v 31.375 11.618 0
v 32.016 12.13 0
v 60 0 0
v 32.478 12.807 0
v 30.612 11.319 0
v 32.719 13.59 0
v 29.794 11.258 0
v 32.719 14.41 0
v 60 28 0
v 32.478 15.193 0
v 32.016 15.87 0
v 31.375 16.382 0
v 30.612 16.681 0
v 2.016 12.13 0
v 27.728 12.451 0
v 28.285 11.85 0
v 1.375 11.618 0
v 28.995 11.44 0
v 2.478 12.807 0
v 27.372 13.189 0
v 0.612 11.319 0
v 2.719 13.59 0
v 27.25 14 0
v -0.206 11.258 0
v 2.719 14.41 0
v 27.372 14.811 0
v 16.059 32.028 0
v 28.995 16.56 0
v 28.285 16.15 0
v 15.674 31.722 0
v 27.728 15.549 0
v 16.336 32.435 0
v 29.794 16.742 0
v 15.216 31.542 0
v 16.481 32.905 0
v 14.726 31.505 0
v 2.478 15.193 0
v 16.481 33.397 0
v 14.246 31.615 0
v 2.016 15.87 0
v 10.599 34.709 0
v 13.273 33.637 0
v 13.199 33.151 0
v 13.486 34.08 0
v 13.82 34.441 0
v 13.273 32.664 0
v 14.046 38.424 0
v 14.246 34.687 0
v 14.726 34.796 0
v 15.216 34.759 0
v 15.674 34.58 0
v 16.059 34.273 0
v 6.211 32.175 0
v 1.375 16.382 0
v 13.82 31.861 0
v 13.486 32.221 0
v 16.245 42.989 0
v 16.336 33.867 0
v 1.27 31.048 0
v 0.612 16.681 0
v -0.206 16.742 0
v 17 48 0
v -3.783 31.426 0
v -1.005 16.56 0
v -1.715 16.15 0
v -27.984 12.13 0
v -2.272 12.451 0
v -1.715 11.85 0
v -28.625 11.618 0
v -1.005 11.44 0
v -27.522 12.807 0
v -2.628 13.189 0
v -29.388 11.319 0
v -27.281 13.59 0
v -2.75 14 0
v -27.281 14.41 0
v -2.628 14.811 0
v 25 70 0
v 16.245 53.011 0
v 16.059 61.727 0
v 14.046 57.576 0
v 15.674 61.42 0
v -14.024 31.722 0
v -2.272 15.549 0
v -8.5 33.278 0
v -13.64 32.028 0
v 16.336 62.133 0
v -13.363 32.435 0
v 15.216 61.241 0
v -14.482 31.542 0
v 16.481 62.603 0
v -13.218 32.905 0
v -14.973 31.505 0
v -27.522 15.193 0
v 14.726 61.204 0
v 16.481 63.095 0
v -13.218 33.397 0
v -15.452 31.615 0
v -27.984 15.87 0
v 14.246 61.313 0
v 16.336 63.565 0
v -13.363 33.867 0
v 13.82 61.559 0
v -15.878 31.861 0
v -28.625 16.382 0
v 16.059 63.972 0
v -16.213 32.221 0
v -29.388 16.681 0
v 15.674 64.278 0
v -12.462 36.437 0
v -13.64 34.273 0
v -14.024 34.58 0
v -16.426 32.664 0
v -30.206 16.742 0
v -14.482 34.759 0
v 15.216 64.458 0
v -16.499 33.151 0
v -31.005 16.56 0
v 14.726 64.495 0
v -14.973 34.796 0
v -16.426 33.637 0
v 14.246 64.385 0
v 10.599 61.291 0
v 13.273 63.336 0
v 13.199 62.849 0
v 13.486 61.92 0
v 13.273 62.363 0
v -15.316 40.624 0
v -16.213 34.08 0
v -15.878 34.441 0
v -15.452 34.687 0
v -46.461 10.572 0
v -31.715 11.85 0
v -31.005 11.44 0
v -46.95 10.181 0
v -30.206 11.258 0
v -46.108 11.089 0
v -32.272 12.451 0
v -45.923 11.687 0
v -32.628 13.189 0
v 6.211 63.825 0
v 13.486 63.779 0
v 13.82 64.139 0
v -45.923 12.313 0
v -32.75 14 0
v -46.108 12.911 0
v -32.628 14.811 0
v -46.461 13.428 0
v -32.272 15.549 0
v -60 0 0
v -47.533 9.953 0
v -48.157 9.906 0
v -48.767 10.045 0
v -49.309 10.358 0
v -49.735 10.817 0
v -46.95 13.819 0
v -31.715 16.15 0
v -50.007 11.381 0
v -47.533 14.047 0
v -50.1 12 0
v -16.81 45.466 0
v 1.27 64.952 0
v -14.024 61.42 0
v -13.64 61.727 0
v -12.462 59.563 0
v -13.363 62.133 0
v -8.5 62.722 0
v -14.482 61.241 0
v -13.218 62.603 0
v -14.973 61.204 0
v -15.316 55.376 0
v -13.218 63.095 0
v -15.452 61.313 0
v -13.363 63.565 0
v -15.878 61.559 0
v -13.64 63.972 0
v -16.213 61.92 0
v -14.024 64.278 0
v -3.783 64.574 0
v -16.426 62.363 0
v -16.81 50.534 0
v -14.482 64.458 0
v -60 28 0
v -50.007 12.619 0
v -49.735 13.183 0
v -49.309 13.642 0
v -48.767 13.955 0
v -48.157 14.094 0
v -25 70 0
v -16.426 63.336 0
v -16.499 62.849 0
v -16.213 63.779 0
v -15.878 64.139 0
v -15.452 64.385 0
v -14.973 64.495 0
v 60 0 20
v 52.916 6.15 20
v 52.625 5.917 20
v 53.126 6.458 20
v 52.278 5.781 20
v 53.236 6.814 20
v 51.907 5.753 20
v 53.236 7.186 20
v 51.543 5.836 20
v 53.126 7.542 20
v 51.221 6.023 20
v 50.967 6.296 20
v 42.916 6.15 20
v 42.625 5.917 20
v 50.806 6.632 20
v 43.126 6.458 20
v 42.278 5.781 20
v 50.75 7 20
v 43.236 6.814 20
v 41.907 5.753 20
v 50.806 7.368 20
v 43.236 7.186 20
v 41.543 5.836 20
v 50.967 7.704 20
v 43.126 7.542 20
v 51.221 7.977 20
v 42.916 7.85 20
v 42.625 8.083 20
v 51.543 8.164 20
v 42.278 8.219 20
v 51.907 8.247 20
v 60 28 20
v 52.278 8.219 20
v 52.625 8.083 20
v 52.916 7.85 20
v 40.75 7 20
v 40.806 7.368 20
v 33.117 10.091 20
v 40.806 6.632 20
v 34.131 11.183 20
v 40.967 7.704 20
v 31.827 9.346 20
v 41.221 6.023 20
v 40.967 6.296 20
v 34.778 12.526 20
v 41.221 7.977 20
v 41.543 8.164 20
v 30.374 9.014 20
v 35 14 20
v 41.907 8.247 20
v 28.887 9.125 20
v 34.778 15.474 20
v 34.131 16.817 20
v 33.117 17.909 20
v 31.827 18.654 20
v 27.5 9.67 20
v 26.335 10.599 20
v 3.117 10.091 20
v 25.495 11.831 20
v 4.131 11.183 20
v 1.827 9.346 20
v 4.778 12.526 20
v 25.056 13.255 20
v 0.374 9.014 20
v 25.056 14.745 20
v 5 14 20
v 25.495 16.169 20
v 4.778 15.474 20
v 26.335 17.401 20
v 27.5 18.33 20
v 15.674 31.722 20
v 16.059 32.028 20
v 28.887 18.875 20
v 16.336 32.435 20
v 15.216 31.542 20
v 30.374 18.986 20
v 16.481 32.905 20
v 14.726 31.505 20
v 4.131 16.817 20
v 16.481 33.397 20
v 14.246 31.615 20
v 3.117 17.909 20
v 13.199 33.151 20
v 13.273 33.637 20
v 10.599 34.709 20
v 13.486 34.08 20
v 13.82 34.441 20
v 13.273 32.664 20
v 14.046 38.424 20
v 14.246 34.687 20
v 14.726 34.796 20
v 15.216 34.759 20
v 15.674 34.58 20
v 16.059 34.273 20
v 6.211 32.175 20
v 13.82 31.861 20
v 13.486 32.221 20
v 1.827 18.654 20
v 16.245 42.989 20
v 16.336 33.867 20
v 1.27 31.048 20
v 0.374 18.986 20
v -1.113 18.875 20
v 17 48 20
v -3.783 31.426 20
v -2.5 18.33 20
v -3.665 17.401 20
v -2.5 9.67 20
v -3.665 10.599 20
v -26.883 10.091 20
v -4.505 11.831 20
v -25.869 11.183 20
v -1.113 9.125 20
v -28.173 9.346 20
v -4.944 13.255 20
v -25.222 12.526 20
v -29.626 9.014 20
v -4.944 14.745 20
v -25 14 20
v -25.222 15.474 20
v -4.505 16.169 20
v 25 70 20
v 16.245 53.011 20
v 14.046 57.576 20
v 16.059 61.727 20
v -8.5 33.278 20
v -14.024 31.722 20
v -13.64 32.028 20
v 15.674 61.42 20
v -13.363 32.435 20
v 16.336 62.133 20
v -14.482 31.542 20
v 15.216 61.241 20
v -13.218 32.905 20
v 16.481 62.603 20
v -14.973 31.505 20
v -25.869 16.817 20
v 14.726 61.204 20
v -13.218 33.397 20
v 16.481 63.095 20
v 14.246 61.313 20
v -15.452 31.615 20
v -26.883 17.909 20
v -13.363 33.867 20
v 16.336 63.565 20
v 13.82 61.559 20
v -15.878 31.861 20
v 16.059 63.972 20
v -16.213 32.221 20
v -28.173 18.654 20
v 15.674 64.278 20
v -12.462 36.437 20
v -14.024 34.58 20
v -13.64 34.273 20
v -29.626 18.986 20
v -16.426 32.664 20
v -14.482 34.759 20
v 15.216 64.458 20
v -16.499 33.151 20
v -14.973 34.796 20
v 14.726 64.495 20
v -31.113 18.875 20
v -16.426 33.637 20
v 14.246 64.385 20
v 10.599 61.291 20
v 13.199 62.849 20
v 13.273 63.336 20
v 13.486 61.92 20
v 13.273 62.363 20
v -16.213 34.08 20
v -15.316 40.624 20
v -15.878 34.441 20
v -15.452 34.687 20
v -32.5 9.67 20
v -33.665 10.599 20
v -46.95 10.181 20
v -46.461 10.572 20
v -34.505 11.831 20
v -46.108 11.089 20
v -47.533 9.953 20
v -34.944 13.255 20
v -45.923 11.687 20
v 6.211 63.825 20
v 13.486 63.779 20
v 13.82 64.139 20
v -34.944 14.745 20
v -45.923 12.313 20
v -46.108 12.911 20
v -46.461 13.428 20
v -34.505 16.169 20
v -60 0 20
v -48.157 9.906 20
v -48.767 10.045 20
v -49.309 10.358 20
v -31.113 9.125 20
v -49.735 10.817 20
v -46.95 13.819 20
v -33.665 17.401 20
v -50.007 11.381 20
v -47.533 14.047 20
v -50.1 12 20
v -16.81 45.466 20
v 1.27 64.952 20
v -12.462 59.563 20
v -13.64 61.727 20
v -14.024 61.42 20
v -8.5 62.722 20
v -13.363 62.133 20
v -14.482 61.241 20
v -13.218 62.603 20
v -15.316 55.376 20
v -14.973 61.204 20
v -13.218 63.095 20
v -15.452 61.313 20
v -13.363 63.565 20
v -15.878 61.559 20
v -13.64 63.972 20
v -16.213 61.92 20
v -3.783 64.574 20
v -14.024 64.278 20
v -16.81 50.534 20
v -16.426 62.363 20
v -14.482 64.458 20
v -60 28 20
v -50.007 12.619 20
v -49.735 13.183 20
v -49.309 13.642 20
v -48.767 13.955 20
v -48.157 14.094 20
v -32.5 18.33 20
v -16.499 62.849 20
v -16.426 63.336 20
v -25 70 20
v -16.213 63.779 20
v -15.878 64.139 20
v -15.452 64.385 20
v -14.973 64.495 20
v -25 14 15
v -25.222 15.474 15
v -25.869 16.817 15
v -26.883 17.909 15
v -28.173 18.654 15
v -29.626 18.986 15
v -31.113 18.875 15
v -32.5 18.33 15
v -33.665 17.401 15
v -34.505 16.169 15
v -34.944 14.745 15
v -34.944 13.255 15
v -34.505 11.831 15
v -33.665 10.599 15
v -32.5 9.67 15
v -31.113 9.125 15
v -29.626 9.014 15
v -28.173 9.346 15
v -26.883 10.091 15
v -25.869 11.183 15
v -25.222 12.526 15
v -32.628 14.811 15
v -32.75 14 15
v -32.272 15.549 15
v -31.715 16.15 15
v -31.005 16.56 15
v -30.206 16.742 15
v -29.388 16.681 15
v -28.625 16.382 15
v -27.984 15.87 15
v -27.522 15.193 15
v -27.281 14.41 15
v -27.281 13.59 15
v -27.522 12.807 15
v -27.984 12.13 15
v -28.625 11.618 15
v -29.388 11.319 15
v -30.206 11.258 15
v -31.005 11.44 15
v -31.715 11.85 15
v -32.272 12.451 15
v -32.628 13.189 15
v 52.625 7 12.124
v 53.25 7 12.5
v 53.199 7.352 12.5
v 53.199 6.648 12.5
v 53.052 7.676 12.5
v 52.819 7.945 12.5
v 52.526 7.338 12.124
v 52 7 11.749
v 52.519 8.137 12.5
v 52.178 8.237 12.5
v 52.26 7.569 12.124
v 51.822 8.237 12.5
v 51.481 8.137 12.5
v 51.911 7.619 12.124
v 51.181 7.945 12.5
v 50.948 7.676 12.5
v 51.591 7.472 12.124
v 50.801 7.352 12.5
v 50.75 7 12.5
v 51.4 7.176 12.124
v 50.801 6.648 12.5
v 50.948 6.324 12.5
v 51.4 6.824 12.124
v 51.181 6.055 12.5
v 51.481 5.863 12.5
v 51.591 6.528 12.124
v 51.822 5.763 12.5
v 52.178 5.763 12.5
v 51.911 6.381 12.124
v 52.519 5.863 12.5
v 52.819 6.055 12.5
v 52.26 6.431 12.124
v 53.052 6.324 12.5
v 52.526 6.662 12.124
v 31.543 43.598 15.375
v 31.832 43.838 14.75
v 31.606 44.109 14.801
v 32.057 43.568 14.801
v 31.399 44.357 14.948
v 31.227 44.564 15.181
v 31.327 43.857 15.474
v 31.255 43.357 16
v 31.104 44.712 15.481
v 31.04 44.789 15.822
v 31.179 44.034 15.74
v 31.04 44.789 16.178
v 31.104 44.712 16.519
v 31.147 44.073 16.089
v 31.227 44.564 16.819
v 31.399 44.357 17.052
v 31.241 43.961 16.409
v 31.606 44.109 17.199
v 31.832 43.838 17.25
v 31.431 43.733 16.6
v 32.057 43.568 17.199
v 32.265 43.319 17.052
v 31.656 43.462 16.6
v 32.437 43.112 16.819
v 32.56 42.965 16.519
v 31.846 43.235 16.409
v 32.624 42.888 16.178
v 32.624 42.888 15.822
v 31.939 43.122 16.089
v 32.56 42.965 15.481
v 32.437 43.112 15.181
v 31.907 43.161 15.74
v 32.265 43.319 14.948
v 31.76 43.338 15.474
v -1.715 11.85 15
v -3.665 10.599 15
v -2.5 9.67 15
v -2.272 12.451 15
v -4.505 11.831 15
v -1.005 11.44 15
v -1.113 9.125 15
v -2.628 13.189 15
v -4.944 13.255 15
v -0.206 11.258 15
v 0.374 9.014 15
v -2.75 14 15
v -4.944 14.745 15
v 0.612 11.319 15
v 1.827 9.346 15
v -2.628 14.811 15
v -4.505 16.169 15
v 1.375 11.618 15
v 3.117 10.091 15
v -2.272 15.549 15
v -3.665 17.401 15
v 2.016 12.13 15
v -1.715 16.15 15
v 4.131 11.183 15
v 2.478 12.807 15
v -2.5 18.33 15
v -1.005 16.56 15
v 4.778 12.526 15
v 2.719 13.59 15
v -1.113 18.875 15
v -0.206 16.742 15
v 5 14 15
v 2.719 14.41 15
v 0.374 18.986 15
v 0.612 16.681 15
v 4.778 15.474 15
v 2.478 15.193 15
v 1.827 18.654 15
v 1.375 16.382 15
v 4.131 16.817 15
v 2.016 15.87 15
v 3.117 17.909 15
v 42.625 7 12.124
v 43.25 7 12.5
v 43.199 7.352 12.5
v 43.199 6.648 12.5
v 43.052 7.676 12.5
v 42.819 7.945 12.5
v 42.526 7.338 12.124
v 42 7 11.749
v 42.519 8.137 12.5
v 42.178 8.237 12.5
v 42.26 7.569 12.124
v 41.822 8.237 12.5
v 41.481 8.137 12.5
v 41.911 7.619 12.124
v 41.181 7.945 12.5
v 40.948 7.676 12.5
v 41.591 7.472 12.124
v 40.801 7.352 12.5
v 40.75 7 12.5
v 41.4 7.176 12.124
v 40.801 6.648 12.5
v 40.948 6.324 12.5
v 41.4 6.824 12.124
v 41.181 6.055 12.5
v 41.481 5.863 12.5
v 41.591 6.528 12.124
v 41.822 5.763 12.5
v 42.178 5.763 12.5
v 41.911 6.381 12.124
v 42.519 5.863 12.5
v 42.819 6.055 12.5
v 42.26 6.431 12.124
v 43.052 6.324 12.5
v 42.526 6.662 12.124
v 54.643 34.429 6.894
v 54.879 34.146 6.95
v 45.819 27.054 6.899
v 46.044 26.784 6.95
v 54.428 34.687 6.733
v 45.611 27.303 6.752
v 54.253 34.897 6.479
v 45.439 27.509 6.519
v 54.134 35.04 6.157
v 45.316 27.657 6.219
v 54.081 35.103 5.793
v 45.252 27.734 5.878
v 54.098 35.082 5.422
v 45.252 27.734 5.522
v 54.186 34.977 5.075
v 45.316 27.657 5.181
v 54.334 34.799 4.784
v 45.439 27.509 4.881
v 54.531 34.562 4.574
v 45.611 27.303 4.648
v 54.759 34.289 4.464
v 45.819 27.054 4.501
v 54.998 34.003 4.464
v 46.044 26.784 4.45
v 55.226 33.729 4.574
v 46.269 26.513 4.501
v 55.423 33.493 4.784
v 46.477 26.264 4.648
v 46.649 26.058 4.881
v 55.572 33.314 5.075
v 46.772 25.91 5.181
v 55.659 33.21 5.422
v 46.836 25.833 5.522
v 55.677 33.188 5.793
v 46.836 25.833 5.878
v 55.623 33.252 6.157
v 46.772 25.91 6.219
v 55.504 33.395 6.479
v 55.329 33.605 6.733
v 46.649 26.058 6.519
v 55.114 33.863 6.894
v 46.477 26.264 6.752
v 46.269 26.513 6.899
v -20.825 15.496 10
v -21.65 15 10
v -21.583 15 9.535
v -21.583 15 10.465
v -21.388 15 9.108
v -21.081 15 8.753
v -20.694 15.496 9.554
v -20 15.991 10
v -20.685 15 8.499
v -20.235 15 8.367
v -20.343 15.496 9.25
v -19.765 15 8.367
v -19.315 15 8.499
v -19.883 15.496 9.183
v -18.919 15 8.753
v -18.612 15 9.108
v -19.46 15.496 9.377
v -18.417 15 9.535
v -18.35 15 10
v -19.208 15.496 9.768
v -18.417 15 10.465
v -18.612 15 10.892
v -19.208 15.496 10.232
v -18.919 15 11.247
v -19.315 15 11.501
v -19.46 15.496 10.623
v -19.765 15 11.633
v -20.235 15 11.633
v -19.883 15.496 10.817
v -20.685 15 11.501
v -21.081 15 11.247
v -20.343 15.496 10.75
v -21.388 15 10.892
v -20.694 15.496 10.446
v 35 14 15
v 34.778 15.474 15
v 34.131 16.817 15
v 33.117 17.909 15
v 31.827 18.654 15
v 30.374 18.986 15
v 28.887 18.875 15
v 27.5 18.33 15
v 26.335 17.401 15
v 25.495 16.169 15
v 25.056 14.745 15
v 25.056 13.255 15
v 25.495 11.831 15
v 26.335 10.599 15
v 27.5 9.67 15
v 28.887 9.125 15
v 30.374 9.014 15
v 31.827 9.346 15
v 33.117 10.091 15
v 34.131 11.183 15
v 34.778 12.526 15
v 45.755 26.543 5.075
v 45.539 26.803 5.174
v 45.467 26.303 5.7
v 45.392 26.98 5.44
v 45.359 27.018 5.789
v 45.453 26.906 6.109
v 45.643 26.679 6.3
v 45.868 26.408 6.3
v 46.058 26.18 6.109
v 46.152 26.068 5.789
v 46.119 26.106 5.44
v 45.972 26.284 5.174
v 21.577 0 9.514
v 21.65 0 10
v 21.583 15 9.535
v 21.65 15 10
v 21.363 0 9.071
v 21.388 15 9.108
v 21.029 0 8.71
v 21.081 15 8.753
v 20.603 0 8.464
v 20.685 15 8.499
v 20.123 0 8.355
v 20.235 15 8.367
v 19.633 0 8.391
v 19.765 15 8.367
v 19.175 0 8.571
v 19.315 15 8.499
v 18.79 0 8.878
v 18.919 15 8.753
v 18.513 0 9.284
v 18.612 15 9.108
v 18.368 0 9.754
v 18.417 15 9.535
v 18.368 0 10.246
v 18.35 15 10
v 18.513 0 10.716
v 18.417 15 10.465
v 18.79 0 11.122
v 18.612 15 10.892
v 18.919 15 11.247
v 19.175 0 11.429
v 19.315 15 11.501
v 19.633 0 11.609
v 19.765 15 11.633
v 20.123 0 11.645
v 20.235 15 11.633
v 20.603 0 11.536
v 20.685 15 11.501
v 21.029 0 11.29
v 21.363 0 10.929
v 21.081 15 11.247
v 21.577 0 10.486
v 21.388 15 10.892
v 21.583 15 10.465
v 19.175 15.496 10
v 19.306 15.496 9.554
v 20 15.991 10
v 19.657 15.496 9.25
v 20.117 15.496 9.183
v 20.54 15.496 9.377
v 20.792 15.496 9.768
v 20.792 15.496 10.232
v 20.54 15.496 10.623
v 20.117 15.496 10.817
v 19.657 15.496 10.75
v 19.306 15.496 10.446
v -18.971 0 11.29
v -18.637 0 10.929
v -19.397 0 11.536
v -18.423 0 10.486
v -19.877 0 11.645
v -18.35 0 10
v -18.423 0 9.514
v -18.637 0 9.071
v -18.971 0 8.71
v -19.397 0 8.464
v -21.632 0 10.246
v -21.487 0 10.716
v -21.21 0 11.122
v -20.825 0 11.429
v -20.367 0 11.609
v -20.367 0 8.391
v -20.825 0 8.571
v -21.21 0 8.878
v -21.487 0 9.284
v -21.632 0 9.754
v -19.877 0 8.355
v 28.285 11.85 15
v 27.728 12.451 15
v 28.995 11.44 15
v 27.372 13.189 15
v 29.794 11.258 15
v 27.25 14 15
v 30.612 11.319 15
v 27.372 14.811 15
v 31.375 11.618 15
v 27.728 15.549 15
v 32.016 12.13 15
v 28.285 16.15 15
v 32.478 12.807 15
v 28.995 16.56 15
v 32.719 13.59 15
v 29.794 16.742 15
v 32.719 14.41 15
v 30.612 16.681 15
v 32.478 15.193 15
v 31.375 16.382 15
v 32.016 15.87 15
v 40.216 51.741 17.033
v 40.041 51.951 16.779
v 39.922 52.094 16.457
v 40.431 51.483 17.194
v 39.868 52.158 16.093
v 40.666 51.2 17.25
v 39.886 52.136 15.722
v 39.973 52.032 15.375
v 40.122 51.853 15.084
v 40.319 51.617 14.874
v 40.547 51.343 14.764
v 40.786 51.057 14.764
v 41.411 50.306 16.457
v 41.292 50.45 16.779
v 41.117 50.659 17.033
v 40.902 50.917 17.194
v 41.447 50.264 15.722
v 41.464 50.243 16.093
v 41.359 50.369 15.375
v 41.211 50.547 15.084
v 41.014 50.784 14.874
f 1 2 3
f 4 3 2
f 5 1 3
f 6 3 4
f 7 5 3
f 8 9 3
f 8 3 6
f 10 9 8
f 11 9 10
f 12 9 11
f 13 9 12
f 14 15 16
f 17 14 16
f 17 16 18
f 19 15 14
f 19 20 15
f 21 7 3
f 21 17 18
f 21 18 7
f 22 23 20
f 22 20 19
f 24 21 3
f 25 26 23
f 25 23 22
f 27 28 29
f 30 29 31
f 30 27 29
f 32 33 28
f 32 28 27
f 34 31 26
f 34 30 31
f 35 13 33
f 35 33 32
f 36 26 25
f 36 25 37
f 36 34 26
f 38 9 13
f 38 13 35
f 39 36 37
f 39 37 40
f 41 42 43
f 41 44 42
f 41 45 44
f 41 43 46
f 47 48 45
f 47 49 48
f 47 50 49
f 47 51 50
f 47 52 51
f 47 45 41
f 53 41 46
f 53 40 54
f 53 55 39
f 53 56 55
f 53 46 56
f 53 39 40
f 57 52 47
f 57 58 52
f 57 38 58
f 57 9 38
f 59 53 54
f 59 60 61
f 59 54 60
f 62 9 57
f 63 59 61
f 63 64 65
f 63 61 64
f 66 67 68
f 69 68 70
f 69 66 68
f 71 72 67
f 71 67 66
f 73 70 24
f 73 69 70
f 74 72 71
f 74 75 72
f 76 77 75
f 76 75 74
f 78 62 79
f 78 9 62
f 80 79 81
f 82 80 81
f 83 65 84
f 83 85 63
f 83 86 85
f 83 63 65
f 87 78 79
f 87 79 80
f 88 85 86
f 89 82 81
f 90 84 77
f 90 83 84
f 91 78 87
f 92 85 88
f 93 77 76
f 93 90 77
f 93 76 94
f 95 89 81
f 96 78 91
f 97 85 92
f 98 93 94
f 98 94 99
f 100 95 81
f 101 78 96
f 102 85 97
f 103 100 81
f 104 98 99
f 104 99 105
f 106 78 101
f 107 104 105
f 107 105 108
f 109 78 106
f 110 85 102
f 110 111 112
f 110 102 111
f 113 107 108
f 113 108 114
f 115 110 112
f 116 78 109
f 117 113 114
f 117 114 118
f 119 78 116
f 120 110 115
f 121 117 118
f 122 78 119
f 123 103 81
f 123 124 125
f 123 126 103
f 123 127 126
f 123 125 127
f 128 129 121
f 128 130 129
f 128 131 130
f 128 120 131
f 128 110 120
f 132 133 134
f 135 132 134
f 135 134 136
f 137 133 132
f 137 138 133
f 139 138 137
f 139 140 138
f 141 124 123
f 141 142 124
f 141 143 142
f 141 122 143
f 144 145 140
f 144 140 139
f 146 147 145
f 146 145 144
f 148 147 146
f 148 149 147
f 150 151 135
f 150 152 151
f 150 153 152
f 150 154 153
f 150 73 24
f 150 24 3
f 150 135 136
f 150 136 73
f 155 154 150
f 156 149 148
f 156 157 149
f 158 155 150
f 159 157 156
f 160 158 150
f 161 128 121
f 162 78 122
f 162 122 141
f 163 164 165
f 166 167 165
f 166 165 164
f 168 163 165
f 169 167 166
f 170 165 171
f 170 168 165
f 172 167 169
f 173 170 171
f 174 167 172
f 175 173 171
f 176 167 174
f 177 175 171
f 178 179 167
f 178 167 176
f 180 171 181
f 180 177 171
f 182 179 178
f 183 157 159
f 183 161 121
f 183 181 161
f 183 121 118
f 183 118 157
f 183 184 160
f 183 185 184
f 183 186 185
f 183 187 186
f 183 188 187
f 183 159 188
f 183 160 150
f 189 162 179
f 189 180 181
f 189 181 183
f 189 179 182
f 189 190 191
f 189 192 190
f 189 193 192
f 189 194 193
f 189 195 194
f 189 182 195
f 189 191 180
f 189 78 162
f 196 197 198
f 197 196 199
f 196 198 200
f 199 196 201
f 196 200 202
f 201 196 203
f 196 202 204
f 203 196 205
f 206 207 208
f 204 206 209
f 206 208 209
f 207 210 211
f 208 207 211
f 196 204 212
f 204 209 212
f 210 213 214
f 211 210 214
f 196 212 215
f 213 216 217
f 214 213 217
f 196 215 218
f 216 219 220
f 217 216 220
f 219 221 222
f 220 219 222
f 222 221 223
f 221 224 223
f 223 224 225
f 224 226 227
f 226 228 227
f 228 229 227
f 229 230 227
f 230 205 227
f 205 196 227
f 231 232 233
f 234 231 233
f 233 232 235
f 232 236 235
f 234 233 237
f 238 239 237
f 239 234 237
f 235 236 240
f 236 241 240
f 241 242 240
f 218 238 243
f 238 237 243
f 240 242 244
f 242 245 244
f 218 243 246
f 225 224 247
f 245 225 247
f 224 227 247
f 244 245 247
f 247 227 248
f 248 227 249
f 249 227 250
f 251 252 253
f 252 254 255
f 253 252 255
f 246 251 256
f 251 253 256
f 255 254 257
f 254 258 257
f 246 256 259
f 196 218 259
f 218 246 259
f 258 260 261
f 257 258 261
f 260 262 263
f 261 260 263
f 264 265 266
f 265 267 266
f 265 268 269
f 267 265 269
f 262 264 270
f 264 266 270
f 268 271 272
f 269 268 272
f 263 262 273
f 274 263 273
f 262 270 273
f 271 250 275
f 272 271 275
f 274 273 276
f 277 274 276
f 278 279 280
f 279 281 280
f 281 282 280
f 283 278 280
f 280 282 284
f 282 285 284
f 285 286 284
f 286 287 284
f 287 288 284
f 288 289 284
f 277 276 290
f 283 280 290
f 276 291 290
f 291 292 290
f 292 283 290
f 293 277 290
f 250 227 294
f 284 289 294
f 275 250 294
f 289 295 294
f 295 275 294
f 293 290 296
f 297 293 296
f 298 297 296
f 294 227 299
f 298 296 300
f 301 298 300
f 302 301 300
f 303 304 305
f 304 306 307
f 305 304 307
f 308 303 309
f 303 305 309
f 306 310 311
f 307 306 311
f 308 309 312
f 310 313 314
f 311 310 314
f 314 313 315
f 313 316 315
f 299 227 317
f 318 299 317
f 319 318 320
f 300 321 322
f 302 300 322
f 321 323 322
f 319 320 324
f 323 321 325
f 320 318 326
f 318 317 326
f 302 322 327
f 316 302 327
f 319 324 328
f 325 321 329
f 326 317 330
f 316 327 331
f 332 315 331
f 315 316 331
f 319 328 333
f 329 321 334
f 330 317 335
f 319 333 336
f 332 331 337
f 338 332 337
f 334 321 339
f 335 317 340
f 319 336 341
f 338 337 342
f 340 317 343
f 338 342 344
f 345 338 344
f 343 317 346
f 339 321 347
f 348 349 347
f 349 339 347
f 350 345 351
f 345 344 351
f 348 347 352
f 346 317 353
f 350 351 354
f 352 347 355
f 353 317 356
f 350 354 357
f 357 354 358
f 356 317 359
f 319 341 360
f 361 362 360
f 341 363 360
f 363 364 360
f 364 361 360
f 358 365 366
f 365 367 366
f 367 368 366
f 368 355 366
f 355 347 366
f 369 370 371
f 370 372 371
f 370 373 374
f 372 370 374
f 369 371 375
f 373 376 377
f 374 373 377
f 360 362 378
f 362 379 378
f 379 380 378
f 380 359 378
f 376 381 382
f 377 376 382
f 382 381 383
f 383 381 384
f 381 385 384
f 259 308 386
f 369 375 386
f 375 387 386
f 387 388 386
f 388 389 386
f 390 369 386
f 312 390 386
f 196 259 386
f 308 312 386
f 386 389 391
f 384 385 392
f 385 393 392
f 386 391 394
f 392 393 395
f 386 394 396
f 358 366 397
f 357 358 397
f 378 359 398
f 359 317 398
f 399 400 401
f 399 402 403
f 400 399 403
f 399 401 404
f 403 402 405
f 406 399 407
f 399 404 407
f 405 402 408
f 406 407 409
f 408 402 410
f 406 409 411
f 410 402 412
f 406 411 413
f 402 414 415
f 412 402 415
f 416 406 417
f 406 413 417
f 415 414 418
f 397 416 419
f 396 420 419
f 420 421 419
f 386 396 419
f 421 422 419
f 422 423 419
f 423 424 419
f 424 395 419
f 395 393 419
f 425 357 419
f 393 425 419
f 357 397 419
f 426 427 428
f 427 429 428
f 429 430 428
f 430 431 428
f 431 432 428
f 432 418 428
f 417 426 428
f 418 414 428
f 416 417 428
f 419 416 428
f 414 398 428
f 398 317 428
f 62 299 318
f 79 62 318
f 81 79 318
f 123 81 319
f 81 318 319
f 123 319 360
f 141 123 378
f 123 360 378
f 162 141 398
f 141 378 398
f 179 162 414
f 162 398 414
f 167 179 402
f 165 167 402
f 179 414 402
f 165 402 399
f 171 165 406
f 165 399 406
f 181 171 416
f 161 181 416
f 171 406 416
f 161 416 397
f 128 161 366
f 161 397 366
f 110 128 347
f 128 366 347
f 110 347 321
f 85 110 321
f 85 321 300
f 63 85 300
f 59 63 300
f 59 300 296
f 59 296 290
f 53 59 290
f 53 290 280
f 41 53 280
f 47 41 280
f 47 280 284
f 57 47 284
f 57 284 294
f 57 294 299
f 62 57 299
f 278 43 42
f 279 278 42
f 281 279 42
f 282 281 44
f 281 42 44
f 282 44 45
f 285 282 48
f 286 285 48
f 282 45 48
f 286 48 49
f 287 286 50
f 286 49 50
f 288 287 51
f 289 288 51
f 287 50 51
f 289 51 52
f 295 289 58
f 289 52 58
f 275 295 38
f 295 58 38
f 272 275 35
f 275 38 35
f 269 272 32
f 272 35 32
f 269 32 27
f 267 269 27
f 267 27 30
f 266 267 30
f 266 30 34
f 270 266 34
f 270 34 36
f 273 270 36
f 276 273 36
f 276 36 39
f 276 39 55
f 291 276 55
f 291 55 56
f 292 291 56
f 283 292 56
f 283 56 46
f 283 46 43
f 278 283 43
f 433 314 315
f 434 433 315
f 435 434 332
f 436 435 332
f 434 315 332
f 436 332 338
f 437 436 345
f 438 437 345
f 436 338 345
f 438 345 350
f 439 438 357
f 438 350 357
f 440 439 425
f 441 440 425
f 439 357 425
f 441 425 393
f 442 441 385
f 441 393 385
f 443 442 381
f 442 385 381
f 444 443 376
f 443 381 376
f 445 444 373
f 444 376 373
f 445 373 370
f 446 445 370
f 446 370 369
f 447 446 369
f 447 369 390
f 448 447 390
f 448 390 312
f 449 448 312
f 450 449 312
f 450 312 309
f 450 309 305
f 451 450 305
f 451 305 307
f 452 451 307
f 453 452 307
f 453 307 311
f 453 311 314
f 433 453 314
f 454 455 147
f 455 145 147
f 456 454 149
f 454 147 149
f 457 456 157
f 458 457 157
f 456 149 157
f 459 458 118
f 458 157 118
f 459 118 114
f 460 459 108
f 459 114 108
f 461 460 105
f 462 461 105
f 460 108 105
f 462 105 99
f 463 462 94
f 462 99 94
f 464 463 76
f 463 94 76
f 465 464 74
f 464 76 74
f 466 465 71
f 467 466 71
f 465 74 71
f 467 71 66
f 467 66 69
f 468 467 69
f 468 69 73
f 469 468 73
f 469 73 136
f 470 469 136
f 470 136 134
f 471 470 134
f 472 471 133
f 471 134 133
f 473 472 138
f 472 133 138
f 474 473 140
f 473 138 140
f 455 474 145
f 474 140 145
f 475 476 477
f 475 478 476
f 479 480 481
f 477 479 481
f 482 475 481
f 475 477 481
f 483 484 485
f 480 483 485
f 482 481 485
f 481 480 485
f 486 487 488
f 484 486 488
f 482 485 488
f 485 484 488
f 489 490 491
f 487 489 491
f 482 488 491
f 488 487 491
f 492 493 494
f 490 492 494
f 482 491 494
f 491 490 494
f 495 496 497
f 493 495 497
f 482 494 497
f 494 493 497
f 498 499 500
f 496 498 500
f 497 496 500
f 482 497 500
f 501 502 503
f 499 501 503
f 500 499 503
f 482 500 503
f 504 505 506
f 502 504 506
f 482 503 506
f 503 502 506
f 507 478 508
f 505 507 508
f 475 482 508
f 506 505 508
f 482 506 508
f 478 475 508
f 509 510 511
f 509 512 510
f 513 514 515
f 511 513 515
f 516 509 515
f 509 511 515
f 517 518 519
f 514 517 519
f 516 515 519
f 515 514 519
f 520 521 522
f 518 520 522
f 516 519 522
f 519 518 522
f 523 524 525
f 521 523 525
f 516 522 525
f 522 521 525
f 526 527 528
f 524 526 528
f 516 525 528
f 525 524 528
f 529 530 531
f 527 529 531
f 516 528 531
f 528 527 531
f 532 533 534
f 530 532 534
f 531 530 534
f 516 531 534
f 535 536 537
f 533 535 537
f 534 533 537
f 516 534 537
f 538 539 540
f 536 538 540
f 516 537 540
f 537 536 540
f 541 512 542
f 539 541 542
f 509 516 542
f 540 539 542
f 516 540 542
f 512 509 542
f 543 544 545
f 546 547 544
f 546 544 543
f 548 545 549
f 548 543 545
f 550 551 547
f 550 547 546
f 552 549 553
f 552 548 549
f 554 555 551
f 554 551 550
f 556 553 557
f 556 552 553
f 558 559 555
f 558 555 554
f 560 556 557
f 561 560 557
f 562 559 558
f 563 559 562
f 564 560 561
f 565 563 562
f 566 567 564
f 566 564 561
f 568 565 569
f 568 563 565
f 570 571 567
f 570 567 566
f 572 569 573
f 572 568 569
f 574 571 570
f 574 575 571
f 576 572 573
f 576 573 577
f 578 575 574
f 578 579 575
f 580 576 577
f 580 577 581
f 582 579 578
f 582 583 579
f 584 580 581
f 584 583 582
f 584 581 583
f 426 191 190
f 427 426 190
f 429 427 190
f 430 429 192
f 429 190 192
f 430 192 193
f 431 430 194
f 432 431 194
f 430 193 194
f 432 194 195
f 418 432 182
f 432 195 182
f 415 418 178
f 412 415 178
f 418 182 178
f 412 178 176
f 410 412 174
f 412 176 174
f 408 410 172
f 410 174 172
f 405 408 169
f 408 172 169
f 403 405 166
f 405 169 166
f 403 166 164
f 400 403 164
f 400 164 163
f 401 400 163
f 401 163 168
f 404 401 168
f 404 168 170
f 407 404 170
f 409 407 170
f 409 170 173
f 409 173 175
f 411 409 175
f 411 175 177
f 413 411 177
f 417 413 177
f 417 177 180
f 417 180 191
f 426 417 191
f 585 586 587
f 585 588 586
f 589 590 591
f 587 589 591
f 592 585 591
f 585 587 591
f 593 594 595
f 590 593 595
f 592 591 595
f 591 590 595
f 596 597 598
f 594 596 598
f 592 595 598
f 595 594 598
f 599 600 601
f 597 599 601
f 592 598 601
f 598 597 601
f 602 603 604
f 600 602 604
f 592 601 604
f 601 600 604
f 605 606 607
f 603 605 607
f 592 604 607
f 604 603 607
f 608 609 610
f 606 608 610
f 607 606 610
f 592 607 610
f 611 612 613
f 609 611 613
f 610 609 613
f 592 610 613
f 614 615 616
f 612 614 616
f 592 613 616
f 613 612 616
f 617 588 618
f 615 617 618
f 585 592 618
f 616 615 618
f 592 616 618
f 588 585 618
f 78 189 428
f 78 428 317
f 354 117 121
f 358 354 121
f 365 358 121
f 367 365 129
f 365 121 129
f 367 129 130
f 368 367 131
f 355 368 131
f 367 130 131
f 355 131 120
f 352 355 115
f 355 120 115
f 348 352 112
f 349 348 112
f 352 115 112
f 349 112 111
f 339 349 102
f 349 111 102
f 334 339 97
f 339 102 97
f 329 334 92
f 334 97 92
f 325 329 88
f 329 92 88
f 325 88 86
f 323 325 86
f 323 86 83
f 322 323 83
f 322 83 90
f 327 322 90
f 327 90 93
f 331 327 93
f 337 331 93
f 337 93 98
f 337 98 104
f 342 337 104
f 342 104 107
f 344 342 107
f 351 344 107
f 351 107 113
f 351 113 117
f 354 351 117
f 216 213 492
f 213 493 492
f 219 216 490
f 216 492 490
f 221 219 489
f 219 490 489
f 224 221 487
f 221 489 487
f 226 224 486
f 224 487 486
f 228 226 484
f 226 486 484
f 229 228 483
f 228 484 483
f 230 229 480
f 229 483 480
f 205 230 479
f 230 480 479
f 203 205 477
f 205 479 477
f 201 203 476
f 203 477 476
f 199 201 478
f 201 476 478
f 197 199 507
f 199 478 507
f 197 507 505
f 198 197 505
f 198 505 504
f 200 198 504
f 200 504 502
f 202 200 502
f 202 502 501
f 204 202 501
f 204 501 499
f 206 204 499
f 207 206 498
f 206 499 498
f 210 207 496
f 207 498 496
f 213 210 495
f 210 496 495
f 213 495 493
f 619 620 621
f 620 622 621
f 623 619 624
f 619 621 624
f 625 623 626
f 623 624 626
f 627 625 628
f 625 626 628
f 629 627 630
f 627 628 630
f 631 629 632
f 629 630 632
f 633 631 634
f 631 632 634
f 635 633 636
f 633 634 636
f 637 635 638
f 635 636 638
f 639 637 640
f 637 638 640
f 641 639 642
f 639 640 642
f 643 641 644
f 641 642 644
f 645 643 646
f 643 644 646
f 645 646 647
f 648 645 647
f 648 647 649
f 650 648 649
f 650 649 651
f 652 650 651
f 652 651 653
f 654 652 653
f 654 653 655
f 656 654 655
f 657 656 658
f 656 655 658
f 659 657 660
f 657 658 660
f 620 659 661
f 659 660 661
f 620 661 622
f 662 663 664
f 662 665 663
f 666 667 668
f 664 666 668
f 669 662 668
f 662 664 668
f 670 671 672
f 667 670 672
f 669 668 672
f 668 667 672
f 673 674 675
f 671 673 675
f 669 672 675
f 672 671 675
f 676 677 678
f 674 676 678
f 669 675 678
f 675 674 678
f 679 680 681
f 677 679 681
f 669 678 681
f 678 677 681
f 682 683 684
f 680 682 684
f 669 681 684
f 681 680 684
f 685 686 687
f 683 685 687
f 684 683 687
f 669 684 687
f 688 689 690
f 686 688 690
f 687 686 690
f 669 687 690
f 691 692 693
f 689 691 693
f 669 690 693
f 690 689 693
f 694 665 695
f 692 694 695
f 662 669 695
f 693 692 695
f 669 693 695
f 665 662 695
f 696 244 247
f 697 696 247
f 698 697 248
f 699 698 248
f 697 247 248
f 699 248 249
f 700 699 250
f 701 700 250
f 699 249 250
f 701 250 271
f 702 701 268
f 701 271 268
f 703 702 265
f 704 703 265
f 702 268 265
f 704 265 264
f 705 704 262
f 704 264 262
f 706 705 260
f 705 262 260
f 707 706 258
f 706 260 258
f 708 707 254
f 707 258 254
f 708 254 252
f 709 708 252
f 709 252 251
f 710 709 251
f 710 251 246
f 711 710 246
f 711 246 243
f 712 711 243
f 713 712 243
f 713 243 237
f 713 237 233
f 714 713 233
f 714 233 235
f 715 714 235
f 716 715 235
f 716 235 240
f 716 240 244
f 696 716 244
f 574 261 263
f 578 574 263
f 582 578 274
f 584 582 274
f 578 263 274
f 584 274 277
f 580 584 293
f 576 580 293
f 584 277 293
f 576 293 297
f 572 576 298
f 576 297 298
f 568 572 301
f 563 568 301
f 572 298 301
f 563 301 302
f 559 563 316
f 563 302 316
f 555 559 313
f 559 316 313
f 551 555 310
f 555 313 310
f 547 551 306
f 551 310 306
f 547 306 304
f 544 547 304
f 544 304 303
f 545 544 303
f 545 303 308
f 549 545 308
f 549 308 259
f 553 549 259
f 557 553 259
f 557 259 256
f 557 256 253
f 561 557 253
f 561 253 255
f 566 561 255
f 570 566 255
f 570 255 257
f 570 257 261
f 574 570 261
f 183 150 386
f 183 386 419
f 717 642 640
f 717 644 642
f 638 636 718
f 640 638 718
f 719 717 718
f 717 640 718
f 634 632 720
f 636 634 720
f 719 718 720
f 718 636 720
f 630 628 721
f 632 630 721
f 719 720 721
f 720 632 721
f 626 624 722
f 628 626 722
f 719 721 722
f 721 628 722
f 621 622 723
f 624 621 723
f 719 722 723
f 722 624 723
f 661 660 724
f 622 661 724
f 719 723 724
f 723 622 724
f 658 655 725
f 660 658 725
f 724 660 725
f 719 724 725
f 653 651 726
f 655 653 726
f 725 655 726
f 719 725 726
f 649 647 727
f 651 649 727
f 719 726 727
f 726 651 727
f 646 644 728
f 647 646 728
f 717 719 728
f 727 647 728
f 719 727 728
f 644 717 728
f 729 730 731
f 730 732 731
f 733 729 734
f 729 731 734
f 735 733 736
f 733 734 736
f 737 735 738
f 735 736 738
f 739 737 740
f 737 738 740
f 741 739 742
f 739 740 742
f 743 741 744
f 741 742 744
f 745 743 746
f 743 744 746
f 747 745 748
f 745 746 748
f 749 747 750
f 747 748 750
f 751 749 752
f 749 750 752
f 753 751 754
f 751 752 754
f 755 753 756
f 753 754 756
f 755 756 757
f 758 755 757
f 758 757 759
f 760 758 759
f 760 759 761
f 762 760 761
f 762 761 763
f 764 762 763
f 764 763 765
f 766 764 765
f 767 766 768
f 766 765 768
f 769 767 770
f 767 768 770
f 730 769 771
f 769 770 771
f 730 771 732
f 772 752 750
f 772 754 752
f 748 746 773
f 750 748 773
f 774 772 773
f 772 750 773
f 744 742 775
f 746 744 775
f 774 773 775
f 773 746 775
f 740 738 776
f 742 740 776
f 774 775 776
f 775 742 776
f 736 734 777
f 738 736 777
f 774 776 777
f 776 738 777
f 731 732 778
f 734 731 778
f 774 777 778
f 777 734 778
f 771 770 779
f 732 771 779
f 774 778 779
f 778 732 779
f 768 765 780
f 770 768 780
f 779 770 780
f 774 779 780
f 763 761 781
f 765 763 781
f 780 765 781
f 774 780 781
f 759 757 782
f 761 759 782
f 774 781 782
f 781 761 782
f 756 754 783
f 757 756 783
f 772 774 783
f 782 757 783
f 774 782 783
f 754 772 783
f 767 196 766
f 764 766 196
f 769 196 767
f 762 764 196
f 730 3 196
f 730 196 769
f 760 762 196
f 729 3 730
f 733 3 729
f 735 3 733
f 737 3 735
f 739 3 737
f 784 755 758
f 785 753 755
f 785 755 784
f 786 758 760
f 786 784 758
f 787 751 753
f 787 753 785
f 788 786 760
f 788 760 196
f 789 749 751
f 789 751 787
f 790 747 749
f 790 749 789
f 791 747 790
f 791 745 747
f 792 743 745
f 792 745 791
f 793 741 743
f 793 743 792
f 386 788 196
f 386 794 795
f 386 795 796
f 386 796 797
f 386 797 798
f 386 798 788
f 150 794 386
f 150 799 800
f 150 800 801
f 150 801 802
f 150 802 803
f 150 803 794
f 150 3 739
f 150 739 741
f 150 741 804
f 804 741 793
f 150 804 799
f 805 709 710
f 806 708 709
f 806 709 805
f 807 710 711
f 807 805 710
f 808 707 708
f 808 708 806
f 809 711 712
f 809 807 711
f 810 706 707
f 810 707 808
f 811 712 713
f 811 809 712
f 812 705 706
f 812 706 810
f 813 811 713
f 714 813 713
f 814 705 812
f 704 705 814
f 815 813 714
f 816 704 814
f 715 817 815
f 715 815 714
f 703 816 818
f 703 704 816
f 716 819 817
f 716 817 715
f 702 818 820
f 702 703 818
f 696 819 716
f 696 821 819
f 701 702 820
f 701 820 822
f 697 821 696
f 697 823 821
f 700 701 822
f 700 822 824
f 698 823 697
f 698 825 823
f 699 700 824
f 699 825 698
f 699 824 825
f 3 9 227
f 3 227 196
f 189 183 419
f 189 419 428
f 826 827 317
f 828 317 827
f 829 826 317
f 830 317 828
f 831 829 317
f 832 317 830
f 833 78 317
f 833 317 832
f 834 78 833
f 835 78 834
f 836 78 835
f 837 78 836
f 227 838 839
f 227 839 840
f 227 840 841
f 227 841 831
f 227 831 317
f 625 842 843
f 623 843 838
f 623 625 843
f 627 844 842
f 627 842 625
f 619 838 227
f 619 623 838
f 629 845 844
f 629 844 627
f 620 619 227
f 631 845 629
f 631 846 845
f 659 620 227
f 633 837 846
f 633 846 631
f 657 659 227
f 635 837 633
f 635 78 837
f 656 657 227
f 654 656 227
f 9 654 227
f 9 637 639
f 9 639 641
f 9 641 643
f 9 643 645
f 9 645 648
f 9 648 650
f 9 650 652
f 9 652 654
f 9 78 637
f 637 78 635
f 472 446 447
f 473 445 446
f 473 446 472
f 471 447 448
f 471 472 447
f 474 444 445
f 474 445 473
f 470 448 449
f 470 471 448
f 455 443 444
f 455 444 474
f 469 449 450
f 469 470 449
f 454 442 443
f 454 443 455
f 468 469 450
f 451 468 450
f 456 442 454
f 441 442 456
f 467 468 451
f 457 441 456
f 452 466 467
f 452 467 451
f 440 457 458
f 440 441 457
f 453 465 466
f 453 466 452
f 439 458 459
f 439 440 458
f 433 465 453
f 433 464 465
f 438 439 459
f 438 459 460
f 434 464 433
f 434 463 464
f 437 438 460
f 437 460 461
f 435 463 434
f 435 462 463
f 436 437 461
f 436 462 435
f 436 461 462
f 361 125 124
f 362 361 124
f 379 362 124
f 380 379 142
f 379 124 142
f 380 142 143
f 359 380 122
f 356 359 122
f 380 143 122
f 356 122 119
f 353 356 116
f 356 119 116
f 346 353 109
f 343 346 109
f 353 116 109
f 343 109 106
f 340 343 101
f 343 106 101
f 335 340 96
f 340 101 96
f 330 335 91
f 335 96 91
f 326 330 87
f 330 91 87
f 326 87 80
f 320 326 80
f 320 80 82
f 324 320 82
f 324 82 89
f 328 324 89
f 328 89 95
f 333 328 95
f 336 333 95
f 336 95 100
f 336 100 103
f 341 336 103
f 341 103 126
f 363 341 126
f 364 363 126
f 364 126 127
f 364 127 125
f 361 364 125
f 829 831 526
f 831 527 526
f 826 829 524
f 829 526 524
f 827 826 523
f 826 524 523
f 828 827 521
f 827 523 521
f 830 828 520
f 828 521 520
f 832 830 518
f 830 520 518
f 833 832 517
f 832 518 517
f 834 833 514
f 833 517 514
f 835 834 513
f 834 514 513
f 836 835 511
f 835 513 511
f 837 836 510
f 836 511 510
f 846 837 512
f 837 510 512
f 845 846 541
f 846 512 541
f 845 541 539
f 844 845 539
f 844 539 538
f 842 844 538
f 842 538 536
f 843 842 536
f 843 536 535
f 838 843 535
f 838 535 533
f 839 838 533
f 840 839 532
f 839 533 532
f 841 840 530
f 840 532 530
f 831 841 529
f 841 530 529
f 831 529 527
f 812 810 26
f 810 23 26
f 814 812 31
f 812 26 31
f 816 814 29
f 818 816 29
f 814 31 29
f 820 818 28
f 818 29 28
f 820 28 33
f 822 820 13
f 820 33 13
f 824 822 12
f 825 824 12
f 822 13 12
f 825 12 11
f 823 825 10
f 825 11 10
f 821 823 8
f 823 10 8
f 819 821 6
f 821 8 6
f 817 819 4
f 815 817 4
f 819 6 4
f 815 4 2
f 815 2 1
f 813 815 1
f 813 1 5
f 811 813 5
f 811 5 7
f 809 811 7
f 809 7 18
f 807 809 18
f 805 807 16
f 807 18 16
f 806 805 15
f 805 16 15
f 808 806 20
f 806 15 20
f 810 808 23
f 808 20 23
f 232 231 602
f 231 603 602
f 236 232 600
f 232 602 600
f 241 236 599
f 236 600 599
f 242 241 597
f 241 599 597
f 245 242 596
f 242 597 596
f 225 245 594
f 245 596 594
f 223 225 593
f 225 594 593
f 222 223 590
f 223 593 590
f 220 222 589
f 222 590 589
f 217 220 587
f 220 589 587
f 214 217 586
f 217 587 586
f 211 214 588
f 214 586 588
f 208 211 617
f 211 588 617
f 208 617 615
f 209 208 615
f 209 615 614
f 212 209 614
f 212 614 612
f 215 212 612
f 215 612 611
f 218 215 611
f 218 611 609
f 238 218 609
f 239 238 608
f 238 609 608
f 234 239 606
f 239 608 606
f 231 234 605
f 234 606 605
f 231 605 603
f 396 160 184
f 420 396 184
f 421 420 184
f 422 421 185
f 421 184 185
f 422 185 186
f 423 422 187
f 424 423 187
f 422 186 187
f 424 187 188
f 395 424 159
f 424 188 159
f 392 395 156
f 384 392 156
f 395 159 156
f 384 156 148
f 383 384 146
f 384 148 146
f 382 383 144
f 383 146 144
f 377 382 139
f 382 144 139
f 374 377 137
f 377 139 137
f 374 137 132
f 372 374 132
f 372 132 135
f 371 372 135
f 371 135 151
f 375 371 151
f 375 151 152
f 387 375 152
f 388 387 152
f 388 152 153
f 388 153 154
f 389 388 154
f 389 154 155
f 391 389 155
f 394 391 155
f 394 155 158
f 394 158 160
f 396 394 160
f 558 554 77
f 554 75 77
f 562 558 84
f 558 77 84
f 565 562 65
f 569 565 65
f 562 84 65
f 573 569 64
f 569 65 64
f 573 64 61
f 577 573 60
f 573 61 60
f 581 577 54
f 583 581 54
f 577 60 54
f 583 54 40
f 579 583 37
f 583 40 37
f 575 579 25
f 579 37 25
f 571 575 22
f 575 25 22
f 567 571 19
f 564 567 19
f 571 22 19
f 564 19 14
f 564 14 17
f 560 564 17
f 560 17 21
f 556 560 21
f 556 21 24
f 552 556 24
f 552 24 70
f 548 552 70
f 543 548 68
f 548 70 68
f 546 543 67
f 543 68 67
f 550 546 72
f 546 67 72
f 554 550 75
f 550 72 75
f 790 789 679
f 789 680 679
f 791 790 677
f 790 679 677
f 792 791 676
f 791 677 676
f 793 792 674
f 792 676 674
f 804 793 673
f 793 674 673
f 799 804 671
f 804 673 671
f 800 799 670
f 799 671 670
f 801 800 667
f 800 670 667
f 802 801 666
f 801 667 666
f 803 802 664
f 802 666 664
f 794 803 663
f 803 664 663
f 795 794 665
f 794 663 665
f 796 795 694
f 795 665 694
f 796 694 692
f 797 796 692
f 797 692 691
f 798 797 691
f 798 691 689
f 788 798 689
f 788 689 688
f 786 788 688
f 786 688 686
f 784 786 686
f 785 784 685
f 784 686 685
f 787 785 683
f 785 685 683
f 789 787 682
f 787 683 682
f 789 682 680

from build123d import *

# Parameters (mm, degrees)
BOSS_EXTRUDE1_DEPTH            = 20
CBORE_FOR_M5_SHCS1_D           = 5.5
CBORE_FOR_M5_SHCS1_CBORE_D     = 10
CBORE_FOR_M5_SHCS1_CBORE_DEPTH = 5
SKETCH4_R                      = 17
CUT_EXTRUDE1_DEPTH             = 95.339811321
M4_TAPPED_HOLE1_D              = 3.3
M4_TAPPED_HOLE2_D              = 3.3
M4_TAPPED_HOLE2_DEPTH          = 15
M4_TAPPED_HOLE2_TIP            = 0.991420021
M3_TAPPED_HOLE1_D              = 2.5
M3_TAPPED_HOLE1_DEPTH          = 7.5
M3_TAPPED_HOLE1_TIP            = 0.751075774
M3_TAPPED_HOLE2_D              = 2.5
M3_TAPPED_HOLE2_DEPTH          = 11.5
M3_TAPPED_HOLE2_TIP            = 0.751075774
M5_TAPPED_HOLE1_D              = 4.2


with BuildPart() as part:
    # Sketch1 → Boss-Extrude1 (new body)
    with BuildSketch(Plane.XY):
        Polygon((60, 0), (-60, 0), (-60, 28), (-25, 70), (25, 70), (60, 28), align=None)
    extrude(amount=BOSS_EXTRUDE1_DEPTH)

    # CBORE for M5 SHCS1 (through all)
    with Locations(Plane(origin=(-30, 14, 20), x_dir=(1, 0, 0), z_dir=(0, 0, 1))):
        with Locations((0, 0), (30, 0), (60, 0)):
            CounterBoreHole(CBORE_FOR_M5_SHCS1_D / 2, CBORE_FOR_M5_SHCS1_CBORE_D / 2, CBORE_FOR_M5_SHCS1_CBORE_DEPTH)

    # Sketch4 → Cut-Extrude1 (cut, through all)
    with BuildSketch(Plane.XY.offset(20)):
        with Locations((0, 48)):
            Circle(SKETCH4_R)
    extrude(amount=-CUT_EXTRUDE1_DEPTH, mode=Mode.SUBTRACT)

    # M4 Tapped Hole1 (through all)
    with Locations(Plane(origin=(-14.849242405, 62.849242405, 20), x_dir=(1, 0, 0), z_dir=(0, 0, 1))):
        with Locations((0, 0), (29.69848481, 0), (29.69848481, -29.69848481), (0, -29.69848481)):
            Hole(M4_TAPPED_HOLE1_D / 2)

    # M4 Tapped Hole2
    with Locations(Plane(origin=(0, 0, 0), x_dir=(-1, 0, 0), z_dir=(0, -1, 0))):
        with Locations((20, -10), (-20, -10)):
            Hole(M4_TAPPED_HOLE2_D / 2, depth=M4_TAPPED_HOLE2_DEPTH)
            with Locations((0, 0, -(M4_TAPPED_HOLE2_DEPTH + M4_TAPPED_HOLE2_TIP / 2))):  # 118° drill point
                Cone(0, M4_TAPPED_HOLE2_D / 2, M4_TAPPED_HOLE2_TIP, mode=Mode.SUBTRACT)

    # M3 Tapped Hole1
    with Locations(Plane(origin=(42, 7, 20), x_dir=(1, 0, 0), z_dir=(0, 0, 1))):
        with Locations((0, 0), (10, 0)):
            Hole(M3_TAPPED_HOLE1_D / 2, depth=M3_TAPPED_HOLE1_DEPTH)
            with Locations((0, 0, -(M3_TAPPED_HOLE1_DEPTH + M3_TAPPED_HOLE1_TIP / 2))):  # 118° drill point
                Cone(0, M3_TAPPED_HOLE1_D / 2, M3_TAPPED_HOLE1_TIP, mode=Mode.SUBTRACT)

    # M3 Tapped Hole2
    with Locations(Plane(origin=(49.180327869, 40.983606557, 0), x_dir=(0, 0, -1), z_dir=(0.7682212795973757, 0.6401843996644799, 0))):
        with Locations((-16, 13.299131849), (-5.7, -8.900868151)):
            Hole(M3_TAPPED_HOLE2_D / 2, depth=M3_TAPPED_HOLE2_DEPTH)
            with Locations((0, 0, -(M3_TAPPED_HOLE2_DEPTH + M3_TAPPED_HOLE2_TIP / 2))):  # 118° drill point
                Cone(0, M3_TAPPED_HOLE2_D / 2, M3_TAPPED_HOLE2_TIP, mode=Mode.SUBTRACT)

    # M5 Tapped Hole1 (through all)
    with Locations(Plane.XY.offset(20)):
        with Locations((-48, 12)):
            Hole(M5_TAPPED_HOLE1_D / 2)


solid = part.part
